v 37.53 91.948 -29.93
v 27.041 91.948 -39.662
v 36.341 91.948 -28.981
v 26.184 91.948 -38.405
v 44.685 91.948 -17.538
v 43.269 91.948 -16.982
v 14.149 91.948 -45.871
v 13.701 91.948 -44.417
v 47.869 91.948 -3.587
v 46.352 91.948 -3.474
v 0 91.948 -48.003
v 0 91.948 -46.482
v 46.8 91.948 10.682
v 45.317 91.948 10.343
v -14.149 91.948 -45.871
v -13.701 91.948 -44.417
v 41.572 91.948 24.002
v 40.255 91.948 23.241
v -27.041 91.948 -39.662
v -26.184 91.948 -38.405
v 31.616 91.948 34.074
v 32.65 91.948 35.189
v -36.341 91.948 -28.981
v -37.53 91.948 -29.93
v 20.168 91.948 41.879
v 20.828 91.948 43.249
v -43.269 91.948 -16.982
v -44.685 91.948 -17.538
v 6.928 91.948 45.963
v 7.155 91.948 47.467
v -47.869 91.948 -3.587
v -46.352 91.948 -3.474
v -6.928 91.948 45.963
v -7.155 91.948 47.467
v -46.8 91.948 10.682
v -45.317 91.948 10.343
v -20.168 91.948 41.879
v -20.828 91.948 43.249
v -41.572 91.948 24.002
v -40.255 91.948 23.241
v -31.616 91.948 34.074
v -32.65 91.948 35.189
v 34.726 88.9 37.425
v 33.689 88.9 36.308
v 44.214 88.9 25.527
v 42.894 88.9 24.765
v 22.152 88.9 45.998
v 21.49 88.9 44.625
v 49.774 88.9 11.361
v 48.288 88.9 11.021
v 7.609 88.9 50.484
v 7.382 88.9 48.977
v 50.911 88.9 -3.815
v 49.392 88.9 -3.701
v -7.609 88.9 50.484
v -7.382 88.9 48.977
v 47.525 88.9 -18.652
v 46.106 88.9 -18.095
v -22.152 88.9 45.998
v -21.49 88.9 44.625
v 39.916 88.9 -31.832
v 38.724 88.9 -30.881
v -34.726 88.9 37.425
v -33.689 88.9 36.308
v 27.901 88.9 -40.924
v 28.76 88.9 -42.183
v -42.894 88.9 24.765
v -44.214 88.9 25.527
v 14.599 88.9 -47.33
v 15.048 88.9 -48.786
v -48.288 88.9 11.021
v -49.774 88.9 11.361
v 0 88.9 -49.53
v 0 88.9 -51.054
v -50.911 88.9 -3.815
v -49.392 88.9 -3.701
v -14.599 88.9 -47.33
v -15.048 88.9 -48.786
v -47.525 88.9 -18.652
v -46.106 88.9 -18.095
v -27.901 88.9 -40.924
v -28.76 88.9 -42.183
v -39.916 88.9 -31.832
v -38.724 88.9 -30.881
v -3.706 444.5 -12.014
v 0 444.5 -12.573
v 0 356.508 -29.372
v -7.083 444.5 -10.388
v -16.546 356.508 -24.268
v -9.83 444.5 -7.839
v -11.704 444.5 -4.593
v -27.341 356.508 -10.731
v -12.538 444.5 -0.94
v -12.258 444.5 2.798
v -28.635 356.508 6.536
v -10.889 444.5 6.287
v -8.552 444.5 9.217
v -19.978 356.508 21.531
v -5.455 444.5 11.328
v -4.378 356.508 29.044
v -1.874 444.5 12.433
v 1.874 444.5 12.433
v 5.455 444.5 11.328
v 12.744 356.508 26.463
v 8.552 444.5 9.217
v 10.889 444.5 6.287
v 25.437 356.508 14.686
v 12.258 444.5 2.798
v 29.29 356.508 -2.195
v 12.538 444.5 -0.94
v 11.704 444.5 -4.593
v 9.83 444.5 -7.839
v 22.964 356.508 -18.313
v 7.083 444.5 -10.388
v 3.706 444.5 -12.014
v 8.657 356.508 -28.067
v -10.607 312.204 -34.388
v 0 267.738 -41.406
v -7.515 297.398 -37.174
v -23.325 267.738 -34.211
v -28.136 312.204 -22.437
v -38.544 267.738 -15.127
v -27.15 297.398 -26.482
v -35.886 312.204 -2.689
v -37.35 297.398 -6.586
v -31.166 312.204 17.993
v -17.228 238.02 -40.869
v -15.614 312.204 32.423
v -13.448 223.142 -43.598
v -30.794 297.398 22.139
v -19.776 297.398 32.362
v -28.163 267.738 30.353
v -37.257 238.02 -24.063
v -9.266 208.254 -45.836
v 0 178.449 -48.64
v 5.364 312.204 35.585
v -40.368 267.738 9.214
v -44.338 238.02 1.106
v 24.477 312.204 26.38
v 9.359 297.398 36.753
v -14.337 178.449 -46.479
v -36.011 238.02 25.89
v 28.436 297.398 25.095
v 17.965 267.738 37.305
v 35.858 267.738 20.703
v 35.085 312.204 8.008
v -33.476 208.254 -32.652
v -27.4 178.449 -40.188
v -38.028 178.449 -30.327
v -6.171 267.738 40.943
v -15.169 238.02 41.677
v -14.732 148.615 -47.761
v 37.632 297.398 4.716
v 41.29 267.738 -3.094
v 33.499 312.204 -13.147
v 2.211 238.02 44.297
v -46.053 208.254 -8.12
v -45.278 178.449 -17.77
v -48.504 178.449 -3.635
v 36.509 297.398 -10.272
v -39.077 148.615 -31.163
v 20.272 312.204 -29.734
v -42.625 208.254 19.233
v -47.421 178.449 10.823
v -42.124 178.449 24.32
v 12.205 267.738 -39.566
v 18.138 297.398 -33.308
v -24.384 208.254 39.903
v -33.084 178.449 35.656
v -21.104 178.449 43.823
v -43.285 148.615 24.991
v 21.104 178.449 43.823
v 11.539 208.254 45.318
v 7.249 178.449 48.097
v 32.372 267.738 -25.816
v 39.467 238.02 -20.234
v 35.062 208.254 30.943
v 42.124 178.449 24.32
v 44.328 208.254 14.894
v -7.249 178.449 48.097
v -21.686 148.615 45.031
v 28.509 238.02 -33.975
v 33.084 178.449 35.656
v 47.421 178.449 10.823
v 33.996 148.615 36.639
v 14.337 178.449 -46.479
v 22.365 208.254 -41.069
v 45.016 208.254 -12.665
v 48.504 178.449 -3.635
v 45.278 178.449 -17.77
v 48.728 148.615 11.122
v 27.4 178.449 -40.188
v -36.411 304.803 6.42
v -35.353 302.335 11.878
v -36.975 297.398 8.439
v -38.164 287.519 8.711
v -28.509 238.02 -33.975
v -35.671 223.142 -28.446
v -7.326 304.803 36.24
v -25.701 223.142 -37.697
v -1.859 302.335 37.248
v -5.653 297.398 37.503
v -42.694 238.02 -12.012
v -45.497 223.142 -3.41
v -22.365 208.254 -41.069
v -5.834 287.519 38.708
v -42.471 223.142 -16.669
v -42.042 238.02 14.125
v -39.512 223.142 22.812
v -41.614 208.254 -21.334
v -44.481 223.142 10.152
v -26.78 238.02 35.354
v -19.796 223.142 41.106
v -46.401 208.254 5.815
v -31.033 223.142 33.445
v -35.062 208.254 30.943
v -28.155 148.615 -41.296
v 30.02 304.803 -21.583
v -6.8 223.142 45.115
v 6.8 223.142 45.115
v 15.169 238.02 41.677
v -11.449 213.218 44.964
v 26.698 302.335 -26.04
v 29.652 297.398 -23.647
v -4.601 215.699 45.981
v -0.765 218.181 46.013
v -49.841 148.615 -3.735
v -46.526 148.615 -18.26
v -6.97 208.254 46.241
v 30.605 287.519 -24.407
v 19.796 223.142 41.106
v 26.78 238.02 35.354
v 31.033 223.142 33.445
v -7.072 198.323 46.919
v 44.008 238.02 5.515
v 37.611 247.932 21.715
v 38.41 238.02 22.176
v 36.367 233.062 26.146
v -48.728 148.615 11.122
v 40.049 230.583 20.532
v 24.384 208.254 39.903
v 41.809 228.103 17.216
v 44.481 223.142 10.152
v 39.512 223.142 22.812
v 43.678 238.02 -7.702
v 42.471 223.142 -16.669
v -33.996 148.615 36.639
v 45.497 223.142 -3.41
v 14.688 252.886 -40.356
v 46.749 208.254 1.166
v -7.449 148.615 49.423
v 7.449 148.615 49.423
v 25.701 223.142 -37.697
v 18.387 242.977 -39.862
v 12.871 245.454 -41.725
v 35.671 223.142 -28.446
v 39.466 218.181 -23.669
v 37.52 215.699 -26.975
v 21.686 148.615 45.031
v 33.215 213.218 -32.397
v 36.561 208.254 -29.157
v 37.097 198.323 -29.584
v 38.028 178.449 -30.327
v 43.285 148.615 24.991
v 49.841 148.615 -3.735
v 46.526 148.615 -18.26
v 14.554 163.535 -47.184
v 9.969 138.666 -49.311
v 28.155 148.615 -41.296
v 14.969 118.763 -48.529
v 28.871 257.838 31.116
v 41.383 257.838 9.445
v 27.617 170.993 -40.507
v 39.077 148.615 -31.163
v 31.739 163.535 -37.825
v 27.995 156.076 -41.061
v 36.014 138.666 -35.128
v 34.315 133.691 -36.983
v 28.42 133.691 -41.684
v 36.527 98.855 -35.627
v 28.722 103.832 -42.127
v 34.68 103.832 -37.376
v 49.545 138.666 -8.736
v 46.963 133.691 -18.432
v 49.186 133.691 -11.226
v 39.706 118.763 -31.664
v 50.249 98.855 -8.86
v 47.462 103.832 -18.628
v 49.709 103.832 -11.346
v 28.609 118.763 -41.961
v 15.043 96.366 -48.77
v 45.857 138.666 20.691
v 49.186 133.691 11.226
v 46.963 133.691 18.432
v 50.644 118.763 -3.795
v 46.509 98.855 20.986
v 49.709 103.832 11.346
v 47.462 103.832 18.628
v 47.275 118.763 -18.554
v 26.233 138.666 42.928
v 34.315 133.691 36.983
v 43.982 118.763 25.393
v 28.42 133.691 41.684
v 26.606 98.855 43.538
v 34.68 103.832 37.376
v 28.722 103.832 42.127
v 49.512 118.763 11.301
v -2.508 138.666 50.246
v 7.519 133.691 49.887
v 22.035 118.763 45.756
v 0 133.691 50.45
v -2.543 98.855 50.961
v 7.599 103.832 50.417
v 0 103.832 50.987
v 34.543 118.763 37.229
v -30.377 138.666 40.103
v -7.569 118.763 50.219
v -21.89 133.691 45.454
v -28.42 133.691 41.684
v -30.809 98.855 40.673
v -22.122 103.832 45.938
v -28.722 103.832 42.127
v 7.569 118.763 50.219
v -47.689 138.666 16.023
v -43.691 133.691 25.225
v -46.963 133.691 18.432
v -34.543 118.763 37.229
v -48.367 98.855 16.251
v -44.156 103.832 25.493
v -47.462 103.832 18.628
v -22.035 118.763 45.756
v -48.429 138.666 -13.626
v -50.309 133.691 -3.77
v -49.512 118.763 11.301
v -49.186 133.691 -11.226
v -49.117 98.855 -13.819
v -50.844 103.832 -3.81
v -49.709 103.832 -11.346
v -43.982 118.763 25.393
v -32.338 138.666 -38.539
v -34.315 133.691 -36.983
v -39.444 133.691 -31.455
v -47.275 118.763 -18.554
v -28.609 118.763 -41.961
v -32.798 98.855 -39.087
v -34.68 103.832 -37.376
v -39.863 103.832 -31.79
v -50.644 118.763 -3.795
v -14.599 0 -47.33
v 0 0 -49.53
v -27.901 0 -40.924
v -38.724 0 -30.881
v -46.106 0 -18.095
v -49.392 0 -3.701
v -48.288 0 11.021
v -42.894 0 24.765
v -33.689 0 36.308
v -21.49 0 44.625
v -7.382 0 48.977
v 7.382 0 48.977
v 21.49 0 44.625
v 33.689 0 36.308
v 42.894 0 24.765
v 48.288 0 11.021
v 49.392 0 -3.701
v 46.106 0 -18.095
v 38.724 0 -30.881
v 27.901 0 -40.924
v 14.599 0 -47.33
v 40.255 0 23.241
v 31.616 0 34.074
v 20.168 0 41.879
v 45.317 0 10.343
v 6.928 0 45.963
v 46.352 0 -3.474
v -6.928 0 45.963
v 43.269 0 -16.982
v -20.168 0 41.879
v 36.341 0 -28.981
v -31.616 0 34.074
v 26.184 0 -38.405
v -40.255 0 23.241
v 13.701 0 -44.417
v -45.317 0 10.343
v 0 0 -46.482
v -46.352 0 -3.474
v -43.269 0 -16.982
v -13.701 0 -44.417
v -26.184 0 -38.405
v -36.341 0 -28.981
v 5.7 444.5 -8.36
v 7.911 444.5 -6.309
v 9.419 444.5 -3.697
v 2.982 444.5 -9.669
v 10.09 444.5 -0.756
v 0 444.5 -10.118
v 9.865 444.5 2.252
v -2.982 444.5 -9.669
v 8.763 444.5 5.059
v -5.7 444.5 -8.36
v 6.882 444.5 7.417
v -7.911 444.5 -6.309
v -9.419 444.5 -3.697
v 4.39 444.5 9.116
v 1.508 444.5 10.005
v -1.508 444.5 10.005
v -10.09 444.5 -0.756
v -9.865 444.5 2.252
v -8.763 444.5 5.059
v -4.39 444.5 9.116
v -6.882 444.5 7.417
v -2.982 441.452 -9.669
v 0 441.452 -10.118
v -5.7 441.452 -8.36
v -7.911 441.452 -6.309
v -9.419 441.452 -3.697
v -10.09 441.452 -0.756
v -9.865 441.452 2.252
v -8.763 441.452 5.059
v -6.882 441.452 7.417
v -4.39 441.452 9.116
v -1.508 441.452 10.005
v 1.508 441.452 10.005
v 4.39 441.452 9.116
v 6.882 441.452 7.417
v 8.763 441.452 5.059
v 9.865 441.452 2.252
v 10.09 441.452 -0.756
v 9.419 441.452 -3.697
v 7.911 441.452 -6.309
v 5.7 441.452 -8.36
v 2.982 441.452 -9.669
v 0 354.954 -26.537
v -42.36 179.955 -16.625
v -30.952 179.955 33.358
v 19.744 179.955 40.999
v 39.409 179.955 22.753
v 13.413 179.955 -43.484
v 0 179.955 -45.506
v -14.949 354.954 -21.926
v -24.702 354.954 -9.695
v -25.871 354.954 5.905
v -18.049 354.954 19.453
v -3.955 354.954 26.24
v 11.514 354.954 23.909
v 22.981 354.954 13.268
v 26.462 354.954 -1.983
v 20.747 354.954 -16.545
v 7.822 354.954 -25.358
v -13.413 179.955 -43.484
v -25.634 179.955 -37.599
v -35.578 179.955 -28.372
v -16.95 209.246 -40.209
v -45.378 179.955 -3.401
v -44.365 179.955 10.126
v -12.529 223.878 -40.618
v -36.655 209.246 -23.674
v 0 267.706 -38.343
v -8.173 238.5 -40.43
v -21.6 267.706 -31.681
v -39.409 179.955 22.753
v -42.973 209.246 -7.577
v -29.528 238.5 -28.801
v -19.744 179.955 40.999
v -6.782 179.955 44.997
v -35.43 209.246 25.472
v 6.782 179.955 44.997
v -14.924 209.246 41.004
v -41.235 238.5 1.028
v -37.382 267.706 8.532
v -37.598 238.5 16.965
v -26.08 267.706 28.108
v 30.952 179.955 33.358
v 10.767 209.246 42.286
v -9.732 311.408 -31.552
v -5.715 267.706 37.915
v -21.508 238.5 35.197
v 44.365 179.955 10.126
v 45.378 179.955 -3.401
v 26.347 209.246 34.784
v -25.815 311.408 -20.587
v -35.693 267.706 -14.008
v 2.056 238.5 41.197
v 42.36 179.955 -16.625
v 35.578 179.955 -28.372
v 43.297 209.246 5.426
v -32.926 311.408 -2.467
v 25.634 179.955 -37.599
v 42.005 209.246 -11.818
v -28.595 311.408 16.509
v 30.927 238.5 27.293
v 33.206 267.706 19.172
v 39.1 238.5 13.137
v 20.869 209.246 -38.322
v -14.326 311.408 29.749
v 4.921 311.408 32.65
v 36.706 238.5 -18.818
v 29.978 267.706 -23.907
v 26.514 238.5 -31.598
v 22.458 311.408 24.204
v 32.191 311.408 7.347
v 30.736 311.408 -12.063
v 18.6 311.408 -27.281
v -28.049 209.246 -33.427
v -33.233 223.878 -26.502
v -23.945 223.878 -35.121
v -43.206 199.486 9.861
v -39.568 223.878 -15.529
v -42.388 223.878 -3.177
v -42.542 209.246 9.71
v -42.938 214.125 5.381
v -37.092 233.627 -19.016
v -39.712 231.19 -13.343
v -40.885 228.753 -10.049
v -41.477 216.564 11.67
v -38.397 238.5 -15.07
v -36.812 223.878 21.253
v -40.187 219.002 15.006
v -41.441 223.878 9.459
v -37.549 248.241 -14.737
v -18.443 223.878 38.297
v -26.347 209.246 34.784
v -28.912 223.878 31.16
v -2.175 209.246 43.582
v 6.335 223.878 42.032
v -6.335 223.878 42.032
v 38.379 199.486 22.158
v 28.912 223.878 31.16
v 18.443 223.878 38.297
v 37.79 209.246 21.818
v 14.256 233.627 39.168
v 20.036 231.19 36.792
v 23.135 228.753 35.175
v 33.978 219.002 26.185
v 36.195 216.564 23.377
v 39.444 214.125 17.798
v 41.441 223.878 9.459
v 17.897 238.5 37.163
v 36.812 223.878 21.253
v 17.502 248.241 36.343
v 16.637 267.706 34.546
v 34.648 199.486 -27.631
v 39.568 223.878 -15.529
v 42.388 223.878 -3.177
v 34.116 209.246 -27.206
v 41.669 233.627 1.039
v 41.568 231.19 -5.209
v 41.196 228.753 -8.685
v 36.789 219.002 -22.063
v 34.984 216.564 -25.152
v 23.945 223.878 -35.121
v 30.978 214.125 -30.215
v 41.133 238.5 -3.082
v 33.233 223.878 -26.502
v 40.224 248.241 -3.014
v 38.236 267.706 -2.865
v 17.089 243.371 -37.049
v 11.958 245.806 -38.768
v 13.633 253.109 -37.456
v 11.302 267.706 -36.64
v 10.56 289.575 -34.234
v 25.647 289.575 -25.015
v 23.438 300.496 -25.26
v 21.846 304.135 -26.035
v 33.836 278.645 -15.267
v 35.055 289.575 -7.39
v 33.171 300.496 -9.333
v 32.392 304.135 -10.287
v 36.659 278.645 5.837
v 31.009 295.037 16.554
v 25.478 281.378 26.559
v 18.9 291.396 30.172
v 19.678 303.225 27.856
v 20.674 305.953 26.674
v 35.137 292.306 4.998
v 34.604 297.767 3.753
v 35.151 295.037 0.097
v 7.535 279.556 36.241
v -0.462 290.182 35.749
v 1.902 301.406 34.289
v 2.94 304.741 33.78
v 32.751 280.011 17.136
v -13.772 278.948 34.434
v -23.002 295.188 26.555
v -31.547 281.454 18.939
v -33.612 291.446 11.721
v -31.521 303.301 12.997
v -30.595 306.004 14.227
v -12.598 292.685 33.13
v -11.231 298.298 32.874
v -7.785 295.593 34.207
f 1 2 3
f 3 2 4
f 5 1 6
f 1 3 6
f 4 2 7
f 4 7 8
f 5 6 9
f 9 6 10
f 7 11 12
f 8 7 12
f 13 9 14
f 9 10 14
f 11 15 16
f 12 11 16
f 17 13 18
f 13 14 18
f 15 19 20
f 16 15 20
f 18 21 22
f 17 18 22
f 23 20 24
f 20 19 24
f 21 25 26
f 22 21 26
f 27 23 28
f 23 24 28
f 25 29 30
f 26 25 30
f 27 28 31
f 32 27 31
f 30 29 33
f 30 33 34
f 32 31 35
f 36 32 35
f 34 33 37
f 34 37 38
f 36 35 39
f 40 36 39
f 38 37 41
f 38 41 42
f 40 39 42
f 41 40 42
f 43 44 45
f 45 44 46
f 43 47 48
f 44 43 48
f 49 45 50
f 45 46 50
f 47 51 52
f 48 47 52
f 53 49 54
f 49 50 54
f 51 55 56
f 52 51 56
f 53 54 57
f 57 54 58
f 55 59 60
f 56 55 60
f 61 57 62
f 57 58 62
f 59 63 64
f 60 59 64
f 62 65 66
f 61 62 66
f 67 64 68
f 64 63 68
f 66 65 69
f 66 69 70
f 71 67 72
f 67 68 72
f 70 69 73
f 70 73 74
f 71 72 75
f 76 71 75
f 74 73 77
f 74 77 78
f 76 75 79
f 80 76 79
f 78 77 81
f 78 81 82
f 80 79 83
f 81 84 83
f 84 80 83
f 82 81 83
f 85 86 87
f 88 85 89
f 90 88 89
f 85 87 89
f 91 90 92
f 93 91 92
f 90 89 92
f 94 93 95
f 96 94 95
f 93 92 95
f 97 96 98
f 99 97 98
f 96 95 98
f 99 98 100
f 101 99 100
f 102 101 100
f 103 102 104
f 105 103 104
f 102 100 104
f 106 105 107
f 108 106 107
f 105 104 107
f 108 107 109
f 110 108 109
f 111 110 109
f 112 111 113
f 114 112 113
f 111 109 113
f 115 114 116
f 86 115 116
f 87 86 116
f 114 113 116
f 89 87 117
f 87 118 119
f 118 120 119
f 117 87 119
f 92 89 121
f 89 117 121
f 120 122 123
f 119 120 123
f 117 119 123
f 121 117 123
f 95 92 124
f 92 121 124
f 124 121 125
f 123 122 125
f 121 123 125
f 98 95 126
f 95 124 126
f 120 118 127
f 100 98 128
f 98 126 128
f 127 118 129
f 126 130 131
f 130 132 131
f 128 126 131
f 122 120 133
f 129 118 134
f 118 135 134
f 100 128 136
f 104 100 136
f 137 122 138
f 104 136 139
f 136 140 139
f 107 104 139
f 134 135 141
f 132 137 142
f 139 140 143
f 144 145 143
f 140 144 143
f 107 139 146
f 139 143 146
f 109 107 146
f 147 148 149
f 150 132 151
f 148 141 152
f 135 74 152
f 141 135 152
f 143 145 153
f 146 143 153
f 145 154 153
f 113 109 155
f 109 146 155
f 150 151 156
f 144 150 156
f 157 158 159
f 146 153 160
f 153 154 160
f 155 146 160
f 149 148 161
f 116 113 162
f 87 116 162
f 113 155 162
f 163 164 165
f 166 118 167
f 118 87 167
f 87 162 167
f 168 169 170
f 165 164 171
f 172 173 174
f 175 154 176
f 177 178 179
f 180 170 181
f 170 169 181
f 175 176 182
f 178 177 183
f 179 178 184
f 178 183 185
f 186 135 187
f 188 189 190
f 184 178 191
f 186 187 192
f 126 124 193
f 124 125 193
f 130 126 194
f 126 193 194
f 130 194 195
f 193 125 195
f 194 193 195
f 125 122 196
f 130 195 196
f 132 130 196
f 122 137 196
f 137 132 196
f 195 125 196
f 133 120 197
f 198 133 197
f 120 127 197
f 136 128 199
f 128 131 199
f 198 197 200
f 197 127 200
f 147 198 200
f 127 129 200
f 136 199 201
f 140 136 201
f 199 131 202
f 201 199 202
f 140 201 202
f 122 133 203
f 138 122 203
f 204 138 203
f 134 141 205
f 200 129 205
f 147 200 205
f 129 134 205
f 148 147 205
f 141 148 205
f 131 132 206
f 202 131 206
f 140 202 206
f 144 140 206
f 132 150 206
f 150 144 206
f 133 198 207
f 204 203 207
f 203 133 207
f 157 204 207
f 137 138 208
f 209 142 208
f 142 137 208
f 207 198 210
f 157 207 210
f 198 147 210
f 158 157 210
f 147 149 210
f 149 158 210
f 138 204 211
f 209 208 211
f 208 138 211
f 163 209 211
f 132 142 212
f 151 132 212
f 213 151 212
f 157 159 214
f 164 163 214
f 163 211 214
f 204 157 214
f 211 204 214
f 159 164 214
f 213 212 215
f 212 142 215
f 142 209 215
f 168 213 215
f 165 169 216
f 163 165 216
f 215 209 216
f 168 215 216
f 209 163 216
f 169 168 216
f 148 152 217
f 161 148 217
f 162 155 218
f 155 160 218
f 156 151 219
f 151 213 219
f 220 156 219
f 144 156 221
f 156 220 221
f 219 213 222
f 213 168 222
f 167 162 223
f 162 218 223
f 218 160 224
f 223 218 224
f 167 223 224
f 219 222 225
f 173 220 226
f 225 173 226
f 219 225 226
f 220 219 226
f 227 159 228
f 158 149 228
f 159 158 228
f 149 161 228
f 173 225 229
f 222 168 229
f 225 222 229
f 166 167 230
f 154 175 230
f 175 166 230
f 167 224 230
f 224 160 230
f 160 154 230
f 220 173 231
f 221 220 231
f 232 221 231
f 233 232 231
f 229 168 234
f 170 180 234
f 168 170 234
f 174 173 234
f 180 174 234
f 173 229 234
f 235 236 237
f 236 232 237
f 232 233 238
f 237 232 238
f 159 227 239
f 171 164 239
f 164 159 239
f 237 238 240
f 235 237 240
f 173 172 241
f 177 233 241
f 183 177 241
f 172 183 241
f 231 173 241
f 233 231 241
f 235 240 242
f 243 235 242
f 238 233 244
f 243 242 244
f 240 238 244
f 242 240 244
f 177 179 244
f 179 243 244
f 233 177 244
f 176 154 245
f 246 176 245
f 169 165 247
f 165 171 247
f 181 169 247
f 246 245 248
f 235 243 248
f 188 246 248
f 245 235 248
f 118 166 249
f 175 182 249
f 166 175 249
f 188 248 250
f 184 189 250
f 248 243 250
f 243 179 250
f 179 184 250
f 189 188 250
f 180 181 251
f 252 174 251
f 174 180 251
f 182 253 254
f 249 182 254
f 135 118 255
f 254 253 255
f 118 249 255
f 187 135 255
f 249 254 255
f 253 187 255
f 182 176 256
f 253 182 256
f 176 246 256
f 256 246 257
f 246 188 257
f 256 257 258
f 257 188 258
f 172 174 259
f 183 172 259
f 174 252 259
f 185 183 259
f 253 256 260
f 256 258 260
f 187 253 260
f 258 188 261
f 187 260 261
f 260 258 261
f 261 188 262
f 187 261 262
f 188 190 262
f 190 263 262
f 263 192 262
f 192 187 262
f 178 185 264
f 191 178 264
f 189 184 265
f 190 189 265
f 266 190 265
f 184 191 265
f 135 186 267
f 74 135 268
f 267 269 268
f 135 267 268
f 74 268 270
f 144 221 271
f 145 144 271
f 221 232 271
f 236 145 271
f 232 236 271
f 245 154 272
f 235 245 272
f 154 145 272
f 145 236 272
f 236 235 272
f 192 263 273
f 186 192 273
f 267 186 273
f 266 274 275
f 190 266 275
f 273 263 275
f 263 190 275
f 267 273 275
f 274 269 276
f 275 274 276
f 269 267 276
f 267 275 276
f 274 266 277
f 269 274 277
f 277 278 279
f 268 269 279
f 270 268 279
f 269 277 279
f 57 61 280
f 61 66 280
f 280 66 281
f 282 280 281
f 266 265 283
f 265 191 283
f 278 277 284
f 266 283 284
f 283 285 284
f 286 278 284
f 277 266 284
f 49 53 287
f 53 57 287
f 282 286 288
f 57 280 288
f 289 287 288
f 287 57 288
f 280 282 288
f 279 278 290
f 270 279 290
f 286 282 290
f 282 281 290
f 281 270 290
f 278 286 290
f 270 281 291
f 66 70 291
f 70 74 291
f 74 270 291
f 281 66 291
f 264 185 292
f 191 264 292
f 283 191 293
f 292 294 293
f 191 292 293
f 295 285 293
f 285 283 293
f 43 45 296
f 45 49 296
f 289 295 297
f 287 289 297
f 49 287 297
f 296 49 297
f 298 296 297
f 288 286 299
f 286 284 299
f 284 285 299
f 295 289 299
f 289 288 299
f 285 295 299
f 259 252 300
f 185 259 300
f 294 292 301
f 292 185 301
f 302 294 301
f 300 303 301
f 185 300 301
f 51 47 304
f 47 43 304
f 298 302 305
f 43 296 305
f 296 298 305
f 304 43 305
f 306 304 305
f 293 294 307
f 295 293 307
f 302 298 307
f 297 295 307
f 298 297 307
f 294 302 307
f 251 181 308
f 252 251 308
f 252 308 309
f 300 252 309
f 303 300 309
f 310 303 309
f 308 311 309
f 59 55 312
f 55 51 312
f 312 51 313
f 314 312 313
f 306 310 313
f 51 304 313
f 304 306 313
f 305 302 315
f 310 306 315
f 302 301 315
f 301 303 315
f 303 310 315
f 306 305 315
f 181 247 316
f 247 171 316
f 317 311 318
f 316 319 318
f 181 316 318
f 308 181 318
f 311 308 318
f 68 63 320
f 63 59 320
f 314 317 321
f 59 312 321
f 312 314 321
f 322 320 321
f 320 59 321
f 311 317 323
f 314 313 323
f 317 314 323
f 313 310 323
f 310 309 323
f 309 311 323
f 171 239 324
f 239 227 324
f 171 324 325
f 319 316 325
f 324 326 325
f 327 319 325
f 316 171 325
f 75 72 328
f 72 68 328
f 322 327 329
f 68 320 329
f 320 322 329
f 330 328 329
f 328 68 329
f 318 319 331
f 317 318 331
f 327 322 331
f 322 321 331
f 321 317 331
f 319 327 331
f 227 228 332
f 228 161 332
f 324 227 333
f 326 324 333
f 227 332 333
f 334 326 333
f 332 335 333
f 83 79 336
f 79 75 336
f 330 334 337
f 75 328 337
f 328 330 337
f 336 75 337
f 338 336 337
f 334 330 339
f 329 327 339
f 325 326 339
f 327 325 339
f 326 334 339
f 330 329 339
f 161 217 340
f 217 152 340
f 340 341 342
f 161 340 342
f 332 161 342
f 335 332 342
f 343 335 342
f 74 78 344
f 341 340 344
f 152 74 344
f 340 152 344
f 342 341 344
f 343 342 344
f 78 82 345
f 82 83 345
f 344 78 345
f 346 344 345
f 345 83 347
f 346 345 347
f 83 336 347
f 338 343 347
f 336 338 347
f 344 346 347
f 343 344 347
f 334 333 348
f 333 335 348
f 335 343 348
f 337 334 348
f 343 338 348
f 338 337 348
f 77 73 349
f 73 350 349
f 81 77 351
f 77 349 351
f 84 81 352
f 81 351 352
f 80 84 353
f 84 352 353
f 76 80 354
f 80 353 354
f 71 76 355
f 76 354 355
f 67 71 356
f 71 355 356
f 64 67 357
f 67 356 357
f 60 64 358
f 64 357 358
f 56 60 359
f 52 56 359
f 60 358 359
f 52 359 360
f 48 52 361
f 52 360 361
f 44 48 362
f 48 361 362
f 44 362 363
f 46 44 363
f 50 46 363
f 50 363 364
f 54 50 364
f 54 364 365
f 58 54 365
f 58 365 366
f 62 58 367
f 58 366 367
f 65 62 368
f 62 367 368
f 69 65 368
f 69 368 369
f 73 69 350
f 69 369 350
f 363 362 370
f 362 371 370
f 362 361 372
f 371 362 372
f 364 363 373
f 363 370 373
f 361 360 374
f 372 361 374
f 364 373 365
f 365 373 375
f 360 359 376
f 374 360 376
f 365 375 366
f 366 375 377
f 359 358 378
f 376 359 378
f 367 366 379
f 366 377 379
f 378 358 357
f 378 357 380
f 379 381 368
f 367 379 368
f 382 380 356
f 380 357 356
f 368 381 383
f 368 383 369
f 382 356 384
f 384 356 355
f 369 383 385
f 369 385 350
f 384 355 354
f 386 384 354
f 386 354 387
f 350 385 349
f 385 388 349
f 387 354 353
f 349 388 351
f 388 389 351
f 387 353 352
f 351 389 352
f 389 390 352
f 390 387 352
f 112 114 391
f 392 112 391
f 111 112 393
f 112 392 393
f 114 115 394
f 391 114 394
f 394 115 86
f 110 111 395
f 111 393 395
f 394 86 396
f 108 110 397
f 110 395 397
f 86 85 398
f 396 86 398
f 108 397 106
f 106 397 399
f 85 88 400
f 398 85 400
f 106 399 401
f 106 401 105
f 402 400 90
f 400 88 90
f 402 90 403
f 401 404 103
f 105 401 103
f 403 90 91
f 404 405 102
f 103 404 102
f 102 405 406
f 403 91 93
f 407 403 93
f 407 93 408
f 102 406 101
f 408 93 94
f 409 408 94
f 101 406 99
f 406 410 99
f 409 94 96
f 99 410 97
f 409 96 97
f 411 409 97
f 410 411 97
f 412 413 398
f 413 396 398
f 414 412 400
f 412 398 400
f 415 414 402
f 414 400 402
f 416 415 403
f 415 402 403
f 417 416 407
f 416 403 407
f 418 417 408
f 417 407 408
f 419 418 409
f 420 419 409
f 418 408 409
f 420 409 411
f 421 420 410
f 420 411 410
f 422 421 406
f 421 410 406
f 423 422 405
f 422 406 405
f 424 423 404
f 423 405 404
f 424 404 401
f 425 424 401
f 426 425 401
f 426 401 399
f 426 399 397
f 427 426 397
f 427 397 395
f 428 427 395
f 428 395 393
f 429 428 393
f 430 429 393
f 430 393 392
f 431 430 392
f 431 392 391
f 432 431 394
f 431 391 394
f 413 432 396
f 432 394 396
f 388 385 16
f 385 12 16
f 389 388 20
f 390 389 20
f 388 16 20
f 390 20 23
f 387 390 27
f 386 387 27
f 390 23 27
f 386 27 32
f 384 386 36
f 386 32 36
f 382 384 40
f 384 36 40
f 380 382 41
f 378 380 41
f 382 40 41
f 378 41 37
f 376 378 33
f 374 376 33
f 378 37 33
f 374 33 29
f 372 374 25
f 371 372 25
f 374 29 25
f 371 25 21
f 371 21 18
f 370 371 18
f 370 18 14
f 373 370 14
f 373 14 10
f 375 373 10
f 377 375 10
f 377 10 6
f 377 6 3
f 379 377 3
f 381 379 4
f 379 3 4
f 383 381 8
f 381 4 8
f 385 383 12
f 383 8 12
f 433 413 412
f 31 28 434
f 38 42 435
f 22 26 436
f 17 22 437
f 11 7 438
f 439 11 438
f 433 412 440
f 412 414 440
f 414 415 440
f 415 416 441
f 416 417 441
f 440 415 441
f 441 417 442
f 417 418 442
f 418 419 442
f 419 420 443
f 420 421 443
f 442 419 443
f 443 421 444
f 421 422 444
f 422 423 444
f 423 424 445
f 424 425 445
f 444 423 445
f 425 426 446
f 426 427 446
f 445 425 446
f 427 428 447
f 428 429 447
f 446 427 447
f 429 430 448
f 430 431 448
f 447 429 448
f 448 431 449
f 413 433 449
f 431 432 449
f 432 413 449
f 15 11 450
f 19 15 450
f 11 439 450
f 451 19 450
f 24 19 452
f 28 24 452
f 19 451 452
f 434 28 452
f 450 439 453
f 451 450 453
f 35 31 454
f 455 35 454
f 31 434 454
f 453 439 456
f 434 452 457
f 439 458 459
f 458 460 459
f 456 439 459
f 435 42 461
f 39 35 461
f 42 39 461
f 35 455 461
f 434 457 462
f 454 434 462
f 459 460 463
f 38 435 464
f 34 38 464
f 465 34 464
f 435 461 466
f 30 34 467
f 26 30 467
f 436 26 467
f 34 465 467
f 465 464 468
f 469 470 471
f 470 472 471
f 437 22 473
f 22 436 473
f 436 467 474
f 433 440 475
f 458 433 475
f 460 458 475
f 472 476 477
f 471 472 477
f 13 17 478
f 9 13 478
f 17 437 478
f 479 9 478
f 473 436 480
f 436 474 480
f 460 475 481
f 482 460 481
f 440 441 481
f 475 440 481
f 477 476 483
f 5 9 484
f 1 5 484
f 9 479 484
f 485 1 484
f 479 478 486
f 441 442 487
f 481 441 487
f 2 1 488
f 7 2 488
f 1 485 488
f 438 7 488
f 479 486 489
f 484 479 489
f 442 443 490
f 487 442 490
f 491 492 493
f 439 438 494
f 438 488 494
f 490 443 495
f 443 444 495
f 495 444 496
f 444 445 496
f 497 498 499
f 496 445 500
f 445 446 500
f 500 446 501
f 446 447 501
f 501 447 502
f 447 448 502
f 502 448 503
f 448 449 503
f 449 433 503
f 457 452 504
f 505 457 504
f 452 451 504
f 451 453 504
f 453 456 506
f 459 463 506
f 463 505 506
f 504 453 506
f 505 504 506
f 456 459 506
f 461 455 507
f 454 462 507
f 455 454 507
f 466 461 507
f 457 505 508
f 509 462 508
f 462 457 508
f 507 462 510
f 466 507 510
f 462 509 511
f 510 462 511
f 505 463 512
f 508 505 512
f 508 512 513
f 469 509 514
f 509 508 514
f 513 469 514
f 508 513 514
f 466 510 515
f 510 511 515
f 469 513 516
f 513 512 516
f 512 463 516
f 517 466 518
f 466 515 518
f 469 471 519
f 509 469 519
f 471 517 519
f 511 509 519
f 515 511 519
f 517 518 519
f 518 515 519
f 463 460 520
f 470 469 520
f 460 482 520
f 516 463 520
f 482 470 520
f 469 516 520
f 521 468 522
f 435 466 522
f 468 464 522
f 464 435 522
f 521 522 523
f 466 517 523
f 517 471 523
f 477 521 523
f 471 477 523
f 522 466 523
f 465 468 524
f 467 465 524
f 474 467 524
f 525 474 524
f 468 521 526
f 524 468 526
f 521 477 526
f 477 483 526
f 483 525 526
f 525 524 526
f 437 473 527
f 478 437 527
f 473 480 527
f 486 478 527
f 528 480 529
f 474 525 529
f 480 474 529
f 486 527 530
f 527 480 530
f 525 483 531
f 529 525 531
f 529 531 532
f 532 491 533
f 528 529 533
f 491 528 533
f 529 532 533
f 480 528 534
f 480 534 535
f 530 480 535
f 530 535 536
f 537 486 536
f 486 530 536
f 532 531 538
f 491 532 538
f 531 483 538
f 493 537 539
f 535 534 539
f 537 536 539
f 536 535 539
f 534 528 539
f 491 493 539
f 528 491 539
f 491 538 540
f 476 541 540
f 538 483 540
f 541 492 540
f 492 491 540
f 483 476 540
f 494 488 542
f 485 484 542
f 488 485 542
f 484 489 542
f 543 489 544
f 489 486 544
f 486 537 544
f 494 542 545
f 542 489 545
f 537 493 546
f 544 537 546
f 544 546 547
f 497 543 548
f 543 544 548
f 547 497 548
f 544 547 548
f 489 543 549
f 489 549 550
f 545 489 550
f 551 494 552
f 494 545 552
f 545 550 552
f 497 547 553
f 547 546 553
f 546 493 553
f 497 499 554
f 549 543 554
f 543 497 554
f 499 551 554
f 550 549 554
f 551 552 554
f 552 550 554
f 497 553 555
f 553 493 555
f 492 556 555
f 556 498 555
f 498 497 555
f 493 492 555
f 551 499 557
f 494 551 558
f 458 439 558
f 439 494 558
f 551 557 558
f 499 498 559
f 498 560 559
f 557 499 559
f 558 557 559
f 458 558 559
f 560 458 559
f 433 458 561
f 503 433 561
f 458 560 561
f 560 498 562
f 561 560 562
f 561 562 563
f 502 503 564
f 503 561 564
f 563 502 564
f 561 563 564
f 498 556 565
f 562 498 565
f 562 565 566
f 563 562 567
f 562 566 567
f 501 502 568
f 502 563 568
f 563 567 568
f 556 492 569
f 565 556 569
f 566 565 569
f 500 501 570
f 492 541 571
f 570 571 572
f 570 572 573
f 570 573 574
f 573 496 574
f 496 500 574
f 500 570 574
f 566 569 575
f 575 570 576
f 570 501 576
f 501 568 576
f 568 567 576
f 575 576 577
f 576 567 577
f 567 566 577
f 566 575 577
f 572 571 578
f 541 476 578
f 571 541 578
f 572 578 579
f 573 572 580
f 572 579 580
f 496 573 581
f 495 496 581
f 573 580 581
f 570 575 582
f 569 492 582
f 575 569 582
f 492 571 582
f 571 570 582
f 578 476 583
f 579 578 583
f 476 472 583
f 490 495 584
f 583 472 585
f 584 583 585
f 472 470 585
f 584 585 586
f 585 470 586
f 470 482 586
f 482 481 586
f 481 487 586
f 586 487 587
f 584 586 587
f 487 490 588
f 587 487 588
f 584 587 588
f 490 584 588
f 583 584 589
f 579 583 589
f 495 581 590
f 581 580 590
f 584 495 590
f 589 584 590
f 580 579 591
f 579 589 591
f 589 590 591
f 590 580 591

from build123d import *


with BuildPart() as part:
    # Sketch2 → Revolve1 (revolve)
    with BuildSketch(Plane.XY, mode=Mode.PRIVATE) as revolve1_sk:
        with BuildLine():
            Line((46.482, 0), (46.482, 91.948))
            Line((46.482, 91.948), (48.003200413, 91.948))
            ThreePointArc((48.003200413, 91.948), (38.343372168, 267.70619245), (10.118403547, 441.452))
            Line((10.118403547, 441.452), (10.118403547, 444.5))
            Line((10.118403547, 444.5), (12.573, 444.5))
            ThreePointArc((12.573, 444.5), (41.405749629, 267.738018442), (51.054, 88.9))
            Line((51.054, 88.9), (49.53, 88.9))
            Line((49.53, 88.9), (49.53, 0))
            Line((49.53, 0), (46.482, 0))
        make_face()
    revolve(revolve1_sk.sketch.rotate(Axis((0, 0, 0), (0, 1, 0)), 90), axis=Axis((0, 0, 0), (0, 1, 0)))


solid = part.part
